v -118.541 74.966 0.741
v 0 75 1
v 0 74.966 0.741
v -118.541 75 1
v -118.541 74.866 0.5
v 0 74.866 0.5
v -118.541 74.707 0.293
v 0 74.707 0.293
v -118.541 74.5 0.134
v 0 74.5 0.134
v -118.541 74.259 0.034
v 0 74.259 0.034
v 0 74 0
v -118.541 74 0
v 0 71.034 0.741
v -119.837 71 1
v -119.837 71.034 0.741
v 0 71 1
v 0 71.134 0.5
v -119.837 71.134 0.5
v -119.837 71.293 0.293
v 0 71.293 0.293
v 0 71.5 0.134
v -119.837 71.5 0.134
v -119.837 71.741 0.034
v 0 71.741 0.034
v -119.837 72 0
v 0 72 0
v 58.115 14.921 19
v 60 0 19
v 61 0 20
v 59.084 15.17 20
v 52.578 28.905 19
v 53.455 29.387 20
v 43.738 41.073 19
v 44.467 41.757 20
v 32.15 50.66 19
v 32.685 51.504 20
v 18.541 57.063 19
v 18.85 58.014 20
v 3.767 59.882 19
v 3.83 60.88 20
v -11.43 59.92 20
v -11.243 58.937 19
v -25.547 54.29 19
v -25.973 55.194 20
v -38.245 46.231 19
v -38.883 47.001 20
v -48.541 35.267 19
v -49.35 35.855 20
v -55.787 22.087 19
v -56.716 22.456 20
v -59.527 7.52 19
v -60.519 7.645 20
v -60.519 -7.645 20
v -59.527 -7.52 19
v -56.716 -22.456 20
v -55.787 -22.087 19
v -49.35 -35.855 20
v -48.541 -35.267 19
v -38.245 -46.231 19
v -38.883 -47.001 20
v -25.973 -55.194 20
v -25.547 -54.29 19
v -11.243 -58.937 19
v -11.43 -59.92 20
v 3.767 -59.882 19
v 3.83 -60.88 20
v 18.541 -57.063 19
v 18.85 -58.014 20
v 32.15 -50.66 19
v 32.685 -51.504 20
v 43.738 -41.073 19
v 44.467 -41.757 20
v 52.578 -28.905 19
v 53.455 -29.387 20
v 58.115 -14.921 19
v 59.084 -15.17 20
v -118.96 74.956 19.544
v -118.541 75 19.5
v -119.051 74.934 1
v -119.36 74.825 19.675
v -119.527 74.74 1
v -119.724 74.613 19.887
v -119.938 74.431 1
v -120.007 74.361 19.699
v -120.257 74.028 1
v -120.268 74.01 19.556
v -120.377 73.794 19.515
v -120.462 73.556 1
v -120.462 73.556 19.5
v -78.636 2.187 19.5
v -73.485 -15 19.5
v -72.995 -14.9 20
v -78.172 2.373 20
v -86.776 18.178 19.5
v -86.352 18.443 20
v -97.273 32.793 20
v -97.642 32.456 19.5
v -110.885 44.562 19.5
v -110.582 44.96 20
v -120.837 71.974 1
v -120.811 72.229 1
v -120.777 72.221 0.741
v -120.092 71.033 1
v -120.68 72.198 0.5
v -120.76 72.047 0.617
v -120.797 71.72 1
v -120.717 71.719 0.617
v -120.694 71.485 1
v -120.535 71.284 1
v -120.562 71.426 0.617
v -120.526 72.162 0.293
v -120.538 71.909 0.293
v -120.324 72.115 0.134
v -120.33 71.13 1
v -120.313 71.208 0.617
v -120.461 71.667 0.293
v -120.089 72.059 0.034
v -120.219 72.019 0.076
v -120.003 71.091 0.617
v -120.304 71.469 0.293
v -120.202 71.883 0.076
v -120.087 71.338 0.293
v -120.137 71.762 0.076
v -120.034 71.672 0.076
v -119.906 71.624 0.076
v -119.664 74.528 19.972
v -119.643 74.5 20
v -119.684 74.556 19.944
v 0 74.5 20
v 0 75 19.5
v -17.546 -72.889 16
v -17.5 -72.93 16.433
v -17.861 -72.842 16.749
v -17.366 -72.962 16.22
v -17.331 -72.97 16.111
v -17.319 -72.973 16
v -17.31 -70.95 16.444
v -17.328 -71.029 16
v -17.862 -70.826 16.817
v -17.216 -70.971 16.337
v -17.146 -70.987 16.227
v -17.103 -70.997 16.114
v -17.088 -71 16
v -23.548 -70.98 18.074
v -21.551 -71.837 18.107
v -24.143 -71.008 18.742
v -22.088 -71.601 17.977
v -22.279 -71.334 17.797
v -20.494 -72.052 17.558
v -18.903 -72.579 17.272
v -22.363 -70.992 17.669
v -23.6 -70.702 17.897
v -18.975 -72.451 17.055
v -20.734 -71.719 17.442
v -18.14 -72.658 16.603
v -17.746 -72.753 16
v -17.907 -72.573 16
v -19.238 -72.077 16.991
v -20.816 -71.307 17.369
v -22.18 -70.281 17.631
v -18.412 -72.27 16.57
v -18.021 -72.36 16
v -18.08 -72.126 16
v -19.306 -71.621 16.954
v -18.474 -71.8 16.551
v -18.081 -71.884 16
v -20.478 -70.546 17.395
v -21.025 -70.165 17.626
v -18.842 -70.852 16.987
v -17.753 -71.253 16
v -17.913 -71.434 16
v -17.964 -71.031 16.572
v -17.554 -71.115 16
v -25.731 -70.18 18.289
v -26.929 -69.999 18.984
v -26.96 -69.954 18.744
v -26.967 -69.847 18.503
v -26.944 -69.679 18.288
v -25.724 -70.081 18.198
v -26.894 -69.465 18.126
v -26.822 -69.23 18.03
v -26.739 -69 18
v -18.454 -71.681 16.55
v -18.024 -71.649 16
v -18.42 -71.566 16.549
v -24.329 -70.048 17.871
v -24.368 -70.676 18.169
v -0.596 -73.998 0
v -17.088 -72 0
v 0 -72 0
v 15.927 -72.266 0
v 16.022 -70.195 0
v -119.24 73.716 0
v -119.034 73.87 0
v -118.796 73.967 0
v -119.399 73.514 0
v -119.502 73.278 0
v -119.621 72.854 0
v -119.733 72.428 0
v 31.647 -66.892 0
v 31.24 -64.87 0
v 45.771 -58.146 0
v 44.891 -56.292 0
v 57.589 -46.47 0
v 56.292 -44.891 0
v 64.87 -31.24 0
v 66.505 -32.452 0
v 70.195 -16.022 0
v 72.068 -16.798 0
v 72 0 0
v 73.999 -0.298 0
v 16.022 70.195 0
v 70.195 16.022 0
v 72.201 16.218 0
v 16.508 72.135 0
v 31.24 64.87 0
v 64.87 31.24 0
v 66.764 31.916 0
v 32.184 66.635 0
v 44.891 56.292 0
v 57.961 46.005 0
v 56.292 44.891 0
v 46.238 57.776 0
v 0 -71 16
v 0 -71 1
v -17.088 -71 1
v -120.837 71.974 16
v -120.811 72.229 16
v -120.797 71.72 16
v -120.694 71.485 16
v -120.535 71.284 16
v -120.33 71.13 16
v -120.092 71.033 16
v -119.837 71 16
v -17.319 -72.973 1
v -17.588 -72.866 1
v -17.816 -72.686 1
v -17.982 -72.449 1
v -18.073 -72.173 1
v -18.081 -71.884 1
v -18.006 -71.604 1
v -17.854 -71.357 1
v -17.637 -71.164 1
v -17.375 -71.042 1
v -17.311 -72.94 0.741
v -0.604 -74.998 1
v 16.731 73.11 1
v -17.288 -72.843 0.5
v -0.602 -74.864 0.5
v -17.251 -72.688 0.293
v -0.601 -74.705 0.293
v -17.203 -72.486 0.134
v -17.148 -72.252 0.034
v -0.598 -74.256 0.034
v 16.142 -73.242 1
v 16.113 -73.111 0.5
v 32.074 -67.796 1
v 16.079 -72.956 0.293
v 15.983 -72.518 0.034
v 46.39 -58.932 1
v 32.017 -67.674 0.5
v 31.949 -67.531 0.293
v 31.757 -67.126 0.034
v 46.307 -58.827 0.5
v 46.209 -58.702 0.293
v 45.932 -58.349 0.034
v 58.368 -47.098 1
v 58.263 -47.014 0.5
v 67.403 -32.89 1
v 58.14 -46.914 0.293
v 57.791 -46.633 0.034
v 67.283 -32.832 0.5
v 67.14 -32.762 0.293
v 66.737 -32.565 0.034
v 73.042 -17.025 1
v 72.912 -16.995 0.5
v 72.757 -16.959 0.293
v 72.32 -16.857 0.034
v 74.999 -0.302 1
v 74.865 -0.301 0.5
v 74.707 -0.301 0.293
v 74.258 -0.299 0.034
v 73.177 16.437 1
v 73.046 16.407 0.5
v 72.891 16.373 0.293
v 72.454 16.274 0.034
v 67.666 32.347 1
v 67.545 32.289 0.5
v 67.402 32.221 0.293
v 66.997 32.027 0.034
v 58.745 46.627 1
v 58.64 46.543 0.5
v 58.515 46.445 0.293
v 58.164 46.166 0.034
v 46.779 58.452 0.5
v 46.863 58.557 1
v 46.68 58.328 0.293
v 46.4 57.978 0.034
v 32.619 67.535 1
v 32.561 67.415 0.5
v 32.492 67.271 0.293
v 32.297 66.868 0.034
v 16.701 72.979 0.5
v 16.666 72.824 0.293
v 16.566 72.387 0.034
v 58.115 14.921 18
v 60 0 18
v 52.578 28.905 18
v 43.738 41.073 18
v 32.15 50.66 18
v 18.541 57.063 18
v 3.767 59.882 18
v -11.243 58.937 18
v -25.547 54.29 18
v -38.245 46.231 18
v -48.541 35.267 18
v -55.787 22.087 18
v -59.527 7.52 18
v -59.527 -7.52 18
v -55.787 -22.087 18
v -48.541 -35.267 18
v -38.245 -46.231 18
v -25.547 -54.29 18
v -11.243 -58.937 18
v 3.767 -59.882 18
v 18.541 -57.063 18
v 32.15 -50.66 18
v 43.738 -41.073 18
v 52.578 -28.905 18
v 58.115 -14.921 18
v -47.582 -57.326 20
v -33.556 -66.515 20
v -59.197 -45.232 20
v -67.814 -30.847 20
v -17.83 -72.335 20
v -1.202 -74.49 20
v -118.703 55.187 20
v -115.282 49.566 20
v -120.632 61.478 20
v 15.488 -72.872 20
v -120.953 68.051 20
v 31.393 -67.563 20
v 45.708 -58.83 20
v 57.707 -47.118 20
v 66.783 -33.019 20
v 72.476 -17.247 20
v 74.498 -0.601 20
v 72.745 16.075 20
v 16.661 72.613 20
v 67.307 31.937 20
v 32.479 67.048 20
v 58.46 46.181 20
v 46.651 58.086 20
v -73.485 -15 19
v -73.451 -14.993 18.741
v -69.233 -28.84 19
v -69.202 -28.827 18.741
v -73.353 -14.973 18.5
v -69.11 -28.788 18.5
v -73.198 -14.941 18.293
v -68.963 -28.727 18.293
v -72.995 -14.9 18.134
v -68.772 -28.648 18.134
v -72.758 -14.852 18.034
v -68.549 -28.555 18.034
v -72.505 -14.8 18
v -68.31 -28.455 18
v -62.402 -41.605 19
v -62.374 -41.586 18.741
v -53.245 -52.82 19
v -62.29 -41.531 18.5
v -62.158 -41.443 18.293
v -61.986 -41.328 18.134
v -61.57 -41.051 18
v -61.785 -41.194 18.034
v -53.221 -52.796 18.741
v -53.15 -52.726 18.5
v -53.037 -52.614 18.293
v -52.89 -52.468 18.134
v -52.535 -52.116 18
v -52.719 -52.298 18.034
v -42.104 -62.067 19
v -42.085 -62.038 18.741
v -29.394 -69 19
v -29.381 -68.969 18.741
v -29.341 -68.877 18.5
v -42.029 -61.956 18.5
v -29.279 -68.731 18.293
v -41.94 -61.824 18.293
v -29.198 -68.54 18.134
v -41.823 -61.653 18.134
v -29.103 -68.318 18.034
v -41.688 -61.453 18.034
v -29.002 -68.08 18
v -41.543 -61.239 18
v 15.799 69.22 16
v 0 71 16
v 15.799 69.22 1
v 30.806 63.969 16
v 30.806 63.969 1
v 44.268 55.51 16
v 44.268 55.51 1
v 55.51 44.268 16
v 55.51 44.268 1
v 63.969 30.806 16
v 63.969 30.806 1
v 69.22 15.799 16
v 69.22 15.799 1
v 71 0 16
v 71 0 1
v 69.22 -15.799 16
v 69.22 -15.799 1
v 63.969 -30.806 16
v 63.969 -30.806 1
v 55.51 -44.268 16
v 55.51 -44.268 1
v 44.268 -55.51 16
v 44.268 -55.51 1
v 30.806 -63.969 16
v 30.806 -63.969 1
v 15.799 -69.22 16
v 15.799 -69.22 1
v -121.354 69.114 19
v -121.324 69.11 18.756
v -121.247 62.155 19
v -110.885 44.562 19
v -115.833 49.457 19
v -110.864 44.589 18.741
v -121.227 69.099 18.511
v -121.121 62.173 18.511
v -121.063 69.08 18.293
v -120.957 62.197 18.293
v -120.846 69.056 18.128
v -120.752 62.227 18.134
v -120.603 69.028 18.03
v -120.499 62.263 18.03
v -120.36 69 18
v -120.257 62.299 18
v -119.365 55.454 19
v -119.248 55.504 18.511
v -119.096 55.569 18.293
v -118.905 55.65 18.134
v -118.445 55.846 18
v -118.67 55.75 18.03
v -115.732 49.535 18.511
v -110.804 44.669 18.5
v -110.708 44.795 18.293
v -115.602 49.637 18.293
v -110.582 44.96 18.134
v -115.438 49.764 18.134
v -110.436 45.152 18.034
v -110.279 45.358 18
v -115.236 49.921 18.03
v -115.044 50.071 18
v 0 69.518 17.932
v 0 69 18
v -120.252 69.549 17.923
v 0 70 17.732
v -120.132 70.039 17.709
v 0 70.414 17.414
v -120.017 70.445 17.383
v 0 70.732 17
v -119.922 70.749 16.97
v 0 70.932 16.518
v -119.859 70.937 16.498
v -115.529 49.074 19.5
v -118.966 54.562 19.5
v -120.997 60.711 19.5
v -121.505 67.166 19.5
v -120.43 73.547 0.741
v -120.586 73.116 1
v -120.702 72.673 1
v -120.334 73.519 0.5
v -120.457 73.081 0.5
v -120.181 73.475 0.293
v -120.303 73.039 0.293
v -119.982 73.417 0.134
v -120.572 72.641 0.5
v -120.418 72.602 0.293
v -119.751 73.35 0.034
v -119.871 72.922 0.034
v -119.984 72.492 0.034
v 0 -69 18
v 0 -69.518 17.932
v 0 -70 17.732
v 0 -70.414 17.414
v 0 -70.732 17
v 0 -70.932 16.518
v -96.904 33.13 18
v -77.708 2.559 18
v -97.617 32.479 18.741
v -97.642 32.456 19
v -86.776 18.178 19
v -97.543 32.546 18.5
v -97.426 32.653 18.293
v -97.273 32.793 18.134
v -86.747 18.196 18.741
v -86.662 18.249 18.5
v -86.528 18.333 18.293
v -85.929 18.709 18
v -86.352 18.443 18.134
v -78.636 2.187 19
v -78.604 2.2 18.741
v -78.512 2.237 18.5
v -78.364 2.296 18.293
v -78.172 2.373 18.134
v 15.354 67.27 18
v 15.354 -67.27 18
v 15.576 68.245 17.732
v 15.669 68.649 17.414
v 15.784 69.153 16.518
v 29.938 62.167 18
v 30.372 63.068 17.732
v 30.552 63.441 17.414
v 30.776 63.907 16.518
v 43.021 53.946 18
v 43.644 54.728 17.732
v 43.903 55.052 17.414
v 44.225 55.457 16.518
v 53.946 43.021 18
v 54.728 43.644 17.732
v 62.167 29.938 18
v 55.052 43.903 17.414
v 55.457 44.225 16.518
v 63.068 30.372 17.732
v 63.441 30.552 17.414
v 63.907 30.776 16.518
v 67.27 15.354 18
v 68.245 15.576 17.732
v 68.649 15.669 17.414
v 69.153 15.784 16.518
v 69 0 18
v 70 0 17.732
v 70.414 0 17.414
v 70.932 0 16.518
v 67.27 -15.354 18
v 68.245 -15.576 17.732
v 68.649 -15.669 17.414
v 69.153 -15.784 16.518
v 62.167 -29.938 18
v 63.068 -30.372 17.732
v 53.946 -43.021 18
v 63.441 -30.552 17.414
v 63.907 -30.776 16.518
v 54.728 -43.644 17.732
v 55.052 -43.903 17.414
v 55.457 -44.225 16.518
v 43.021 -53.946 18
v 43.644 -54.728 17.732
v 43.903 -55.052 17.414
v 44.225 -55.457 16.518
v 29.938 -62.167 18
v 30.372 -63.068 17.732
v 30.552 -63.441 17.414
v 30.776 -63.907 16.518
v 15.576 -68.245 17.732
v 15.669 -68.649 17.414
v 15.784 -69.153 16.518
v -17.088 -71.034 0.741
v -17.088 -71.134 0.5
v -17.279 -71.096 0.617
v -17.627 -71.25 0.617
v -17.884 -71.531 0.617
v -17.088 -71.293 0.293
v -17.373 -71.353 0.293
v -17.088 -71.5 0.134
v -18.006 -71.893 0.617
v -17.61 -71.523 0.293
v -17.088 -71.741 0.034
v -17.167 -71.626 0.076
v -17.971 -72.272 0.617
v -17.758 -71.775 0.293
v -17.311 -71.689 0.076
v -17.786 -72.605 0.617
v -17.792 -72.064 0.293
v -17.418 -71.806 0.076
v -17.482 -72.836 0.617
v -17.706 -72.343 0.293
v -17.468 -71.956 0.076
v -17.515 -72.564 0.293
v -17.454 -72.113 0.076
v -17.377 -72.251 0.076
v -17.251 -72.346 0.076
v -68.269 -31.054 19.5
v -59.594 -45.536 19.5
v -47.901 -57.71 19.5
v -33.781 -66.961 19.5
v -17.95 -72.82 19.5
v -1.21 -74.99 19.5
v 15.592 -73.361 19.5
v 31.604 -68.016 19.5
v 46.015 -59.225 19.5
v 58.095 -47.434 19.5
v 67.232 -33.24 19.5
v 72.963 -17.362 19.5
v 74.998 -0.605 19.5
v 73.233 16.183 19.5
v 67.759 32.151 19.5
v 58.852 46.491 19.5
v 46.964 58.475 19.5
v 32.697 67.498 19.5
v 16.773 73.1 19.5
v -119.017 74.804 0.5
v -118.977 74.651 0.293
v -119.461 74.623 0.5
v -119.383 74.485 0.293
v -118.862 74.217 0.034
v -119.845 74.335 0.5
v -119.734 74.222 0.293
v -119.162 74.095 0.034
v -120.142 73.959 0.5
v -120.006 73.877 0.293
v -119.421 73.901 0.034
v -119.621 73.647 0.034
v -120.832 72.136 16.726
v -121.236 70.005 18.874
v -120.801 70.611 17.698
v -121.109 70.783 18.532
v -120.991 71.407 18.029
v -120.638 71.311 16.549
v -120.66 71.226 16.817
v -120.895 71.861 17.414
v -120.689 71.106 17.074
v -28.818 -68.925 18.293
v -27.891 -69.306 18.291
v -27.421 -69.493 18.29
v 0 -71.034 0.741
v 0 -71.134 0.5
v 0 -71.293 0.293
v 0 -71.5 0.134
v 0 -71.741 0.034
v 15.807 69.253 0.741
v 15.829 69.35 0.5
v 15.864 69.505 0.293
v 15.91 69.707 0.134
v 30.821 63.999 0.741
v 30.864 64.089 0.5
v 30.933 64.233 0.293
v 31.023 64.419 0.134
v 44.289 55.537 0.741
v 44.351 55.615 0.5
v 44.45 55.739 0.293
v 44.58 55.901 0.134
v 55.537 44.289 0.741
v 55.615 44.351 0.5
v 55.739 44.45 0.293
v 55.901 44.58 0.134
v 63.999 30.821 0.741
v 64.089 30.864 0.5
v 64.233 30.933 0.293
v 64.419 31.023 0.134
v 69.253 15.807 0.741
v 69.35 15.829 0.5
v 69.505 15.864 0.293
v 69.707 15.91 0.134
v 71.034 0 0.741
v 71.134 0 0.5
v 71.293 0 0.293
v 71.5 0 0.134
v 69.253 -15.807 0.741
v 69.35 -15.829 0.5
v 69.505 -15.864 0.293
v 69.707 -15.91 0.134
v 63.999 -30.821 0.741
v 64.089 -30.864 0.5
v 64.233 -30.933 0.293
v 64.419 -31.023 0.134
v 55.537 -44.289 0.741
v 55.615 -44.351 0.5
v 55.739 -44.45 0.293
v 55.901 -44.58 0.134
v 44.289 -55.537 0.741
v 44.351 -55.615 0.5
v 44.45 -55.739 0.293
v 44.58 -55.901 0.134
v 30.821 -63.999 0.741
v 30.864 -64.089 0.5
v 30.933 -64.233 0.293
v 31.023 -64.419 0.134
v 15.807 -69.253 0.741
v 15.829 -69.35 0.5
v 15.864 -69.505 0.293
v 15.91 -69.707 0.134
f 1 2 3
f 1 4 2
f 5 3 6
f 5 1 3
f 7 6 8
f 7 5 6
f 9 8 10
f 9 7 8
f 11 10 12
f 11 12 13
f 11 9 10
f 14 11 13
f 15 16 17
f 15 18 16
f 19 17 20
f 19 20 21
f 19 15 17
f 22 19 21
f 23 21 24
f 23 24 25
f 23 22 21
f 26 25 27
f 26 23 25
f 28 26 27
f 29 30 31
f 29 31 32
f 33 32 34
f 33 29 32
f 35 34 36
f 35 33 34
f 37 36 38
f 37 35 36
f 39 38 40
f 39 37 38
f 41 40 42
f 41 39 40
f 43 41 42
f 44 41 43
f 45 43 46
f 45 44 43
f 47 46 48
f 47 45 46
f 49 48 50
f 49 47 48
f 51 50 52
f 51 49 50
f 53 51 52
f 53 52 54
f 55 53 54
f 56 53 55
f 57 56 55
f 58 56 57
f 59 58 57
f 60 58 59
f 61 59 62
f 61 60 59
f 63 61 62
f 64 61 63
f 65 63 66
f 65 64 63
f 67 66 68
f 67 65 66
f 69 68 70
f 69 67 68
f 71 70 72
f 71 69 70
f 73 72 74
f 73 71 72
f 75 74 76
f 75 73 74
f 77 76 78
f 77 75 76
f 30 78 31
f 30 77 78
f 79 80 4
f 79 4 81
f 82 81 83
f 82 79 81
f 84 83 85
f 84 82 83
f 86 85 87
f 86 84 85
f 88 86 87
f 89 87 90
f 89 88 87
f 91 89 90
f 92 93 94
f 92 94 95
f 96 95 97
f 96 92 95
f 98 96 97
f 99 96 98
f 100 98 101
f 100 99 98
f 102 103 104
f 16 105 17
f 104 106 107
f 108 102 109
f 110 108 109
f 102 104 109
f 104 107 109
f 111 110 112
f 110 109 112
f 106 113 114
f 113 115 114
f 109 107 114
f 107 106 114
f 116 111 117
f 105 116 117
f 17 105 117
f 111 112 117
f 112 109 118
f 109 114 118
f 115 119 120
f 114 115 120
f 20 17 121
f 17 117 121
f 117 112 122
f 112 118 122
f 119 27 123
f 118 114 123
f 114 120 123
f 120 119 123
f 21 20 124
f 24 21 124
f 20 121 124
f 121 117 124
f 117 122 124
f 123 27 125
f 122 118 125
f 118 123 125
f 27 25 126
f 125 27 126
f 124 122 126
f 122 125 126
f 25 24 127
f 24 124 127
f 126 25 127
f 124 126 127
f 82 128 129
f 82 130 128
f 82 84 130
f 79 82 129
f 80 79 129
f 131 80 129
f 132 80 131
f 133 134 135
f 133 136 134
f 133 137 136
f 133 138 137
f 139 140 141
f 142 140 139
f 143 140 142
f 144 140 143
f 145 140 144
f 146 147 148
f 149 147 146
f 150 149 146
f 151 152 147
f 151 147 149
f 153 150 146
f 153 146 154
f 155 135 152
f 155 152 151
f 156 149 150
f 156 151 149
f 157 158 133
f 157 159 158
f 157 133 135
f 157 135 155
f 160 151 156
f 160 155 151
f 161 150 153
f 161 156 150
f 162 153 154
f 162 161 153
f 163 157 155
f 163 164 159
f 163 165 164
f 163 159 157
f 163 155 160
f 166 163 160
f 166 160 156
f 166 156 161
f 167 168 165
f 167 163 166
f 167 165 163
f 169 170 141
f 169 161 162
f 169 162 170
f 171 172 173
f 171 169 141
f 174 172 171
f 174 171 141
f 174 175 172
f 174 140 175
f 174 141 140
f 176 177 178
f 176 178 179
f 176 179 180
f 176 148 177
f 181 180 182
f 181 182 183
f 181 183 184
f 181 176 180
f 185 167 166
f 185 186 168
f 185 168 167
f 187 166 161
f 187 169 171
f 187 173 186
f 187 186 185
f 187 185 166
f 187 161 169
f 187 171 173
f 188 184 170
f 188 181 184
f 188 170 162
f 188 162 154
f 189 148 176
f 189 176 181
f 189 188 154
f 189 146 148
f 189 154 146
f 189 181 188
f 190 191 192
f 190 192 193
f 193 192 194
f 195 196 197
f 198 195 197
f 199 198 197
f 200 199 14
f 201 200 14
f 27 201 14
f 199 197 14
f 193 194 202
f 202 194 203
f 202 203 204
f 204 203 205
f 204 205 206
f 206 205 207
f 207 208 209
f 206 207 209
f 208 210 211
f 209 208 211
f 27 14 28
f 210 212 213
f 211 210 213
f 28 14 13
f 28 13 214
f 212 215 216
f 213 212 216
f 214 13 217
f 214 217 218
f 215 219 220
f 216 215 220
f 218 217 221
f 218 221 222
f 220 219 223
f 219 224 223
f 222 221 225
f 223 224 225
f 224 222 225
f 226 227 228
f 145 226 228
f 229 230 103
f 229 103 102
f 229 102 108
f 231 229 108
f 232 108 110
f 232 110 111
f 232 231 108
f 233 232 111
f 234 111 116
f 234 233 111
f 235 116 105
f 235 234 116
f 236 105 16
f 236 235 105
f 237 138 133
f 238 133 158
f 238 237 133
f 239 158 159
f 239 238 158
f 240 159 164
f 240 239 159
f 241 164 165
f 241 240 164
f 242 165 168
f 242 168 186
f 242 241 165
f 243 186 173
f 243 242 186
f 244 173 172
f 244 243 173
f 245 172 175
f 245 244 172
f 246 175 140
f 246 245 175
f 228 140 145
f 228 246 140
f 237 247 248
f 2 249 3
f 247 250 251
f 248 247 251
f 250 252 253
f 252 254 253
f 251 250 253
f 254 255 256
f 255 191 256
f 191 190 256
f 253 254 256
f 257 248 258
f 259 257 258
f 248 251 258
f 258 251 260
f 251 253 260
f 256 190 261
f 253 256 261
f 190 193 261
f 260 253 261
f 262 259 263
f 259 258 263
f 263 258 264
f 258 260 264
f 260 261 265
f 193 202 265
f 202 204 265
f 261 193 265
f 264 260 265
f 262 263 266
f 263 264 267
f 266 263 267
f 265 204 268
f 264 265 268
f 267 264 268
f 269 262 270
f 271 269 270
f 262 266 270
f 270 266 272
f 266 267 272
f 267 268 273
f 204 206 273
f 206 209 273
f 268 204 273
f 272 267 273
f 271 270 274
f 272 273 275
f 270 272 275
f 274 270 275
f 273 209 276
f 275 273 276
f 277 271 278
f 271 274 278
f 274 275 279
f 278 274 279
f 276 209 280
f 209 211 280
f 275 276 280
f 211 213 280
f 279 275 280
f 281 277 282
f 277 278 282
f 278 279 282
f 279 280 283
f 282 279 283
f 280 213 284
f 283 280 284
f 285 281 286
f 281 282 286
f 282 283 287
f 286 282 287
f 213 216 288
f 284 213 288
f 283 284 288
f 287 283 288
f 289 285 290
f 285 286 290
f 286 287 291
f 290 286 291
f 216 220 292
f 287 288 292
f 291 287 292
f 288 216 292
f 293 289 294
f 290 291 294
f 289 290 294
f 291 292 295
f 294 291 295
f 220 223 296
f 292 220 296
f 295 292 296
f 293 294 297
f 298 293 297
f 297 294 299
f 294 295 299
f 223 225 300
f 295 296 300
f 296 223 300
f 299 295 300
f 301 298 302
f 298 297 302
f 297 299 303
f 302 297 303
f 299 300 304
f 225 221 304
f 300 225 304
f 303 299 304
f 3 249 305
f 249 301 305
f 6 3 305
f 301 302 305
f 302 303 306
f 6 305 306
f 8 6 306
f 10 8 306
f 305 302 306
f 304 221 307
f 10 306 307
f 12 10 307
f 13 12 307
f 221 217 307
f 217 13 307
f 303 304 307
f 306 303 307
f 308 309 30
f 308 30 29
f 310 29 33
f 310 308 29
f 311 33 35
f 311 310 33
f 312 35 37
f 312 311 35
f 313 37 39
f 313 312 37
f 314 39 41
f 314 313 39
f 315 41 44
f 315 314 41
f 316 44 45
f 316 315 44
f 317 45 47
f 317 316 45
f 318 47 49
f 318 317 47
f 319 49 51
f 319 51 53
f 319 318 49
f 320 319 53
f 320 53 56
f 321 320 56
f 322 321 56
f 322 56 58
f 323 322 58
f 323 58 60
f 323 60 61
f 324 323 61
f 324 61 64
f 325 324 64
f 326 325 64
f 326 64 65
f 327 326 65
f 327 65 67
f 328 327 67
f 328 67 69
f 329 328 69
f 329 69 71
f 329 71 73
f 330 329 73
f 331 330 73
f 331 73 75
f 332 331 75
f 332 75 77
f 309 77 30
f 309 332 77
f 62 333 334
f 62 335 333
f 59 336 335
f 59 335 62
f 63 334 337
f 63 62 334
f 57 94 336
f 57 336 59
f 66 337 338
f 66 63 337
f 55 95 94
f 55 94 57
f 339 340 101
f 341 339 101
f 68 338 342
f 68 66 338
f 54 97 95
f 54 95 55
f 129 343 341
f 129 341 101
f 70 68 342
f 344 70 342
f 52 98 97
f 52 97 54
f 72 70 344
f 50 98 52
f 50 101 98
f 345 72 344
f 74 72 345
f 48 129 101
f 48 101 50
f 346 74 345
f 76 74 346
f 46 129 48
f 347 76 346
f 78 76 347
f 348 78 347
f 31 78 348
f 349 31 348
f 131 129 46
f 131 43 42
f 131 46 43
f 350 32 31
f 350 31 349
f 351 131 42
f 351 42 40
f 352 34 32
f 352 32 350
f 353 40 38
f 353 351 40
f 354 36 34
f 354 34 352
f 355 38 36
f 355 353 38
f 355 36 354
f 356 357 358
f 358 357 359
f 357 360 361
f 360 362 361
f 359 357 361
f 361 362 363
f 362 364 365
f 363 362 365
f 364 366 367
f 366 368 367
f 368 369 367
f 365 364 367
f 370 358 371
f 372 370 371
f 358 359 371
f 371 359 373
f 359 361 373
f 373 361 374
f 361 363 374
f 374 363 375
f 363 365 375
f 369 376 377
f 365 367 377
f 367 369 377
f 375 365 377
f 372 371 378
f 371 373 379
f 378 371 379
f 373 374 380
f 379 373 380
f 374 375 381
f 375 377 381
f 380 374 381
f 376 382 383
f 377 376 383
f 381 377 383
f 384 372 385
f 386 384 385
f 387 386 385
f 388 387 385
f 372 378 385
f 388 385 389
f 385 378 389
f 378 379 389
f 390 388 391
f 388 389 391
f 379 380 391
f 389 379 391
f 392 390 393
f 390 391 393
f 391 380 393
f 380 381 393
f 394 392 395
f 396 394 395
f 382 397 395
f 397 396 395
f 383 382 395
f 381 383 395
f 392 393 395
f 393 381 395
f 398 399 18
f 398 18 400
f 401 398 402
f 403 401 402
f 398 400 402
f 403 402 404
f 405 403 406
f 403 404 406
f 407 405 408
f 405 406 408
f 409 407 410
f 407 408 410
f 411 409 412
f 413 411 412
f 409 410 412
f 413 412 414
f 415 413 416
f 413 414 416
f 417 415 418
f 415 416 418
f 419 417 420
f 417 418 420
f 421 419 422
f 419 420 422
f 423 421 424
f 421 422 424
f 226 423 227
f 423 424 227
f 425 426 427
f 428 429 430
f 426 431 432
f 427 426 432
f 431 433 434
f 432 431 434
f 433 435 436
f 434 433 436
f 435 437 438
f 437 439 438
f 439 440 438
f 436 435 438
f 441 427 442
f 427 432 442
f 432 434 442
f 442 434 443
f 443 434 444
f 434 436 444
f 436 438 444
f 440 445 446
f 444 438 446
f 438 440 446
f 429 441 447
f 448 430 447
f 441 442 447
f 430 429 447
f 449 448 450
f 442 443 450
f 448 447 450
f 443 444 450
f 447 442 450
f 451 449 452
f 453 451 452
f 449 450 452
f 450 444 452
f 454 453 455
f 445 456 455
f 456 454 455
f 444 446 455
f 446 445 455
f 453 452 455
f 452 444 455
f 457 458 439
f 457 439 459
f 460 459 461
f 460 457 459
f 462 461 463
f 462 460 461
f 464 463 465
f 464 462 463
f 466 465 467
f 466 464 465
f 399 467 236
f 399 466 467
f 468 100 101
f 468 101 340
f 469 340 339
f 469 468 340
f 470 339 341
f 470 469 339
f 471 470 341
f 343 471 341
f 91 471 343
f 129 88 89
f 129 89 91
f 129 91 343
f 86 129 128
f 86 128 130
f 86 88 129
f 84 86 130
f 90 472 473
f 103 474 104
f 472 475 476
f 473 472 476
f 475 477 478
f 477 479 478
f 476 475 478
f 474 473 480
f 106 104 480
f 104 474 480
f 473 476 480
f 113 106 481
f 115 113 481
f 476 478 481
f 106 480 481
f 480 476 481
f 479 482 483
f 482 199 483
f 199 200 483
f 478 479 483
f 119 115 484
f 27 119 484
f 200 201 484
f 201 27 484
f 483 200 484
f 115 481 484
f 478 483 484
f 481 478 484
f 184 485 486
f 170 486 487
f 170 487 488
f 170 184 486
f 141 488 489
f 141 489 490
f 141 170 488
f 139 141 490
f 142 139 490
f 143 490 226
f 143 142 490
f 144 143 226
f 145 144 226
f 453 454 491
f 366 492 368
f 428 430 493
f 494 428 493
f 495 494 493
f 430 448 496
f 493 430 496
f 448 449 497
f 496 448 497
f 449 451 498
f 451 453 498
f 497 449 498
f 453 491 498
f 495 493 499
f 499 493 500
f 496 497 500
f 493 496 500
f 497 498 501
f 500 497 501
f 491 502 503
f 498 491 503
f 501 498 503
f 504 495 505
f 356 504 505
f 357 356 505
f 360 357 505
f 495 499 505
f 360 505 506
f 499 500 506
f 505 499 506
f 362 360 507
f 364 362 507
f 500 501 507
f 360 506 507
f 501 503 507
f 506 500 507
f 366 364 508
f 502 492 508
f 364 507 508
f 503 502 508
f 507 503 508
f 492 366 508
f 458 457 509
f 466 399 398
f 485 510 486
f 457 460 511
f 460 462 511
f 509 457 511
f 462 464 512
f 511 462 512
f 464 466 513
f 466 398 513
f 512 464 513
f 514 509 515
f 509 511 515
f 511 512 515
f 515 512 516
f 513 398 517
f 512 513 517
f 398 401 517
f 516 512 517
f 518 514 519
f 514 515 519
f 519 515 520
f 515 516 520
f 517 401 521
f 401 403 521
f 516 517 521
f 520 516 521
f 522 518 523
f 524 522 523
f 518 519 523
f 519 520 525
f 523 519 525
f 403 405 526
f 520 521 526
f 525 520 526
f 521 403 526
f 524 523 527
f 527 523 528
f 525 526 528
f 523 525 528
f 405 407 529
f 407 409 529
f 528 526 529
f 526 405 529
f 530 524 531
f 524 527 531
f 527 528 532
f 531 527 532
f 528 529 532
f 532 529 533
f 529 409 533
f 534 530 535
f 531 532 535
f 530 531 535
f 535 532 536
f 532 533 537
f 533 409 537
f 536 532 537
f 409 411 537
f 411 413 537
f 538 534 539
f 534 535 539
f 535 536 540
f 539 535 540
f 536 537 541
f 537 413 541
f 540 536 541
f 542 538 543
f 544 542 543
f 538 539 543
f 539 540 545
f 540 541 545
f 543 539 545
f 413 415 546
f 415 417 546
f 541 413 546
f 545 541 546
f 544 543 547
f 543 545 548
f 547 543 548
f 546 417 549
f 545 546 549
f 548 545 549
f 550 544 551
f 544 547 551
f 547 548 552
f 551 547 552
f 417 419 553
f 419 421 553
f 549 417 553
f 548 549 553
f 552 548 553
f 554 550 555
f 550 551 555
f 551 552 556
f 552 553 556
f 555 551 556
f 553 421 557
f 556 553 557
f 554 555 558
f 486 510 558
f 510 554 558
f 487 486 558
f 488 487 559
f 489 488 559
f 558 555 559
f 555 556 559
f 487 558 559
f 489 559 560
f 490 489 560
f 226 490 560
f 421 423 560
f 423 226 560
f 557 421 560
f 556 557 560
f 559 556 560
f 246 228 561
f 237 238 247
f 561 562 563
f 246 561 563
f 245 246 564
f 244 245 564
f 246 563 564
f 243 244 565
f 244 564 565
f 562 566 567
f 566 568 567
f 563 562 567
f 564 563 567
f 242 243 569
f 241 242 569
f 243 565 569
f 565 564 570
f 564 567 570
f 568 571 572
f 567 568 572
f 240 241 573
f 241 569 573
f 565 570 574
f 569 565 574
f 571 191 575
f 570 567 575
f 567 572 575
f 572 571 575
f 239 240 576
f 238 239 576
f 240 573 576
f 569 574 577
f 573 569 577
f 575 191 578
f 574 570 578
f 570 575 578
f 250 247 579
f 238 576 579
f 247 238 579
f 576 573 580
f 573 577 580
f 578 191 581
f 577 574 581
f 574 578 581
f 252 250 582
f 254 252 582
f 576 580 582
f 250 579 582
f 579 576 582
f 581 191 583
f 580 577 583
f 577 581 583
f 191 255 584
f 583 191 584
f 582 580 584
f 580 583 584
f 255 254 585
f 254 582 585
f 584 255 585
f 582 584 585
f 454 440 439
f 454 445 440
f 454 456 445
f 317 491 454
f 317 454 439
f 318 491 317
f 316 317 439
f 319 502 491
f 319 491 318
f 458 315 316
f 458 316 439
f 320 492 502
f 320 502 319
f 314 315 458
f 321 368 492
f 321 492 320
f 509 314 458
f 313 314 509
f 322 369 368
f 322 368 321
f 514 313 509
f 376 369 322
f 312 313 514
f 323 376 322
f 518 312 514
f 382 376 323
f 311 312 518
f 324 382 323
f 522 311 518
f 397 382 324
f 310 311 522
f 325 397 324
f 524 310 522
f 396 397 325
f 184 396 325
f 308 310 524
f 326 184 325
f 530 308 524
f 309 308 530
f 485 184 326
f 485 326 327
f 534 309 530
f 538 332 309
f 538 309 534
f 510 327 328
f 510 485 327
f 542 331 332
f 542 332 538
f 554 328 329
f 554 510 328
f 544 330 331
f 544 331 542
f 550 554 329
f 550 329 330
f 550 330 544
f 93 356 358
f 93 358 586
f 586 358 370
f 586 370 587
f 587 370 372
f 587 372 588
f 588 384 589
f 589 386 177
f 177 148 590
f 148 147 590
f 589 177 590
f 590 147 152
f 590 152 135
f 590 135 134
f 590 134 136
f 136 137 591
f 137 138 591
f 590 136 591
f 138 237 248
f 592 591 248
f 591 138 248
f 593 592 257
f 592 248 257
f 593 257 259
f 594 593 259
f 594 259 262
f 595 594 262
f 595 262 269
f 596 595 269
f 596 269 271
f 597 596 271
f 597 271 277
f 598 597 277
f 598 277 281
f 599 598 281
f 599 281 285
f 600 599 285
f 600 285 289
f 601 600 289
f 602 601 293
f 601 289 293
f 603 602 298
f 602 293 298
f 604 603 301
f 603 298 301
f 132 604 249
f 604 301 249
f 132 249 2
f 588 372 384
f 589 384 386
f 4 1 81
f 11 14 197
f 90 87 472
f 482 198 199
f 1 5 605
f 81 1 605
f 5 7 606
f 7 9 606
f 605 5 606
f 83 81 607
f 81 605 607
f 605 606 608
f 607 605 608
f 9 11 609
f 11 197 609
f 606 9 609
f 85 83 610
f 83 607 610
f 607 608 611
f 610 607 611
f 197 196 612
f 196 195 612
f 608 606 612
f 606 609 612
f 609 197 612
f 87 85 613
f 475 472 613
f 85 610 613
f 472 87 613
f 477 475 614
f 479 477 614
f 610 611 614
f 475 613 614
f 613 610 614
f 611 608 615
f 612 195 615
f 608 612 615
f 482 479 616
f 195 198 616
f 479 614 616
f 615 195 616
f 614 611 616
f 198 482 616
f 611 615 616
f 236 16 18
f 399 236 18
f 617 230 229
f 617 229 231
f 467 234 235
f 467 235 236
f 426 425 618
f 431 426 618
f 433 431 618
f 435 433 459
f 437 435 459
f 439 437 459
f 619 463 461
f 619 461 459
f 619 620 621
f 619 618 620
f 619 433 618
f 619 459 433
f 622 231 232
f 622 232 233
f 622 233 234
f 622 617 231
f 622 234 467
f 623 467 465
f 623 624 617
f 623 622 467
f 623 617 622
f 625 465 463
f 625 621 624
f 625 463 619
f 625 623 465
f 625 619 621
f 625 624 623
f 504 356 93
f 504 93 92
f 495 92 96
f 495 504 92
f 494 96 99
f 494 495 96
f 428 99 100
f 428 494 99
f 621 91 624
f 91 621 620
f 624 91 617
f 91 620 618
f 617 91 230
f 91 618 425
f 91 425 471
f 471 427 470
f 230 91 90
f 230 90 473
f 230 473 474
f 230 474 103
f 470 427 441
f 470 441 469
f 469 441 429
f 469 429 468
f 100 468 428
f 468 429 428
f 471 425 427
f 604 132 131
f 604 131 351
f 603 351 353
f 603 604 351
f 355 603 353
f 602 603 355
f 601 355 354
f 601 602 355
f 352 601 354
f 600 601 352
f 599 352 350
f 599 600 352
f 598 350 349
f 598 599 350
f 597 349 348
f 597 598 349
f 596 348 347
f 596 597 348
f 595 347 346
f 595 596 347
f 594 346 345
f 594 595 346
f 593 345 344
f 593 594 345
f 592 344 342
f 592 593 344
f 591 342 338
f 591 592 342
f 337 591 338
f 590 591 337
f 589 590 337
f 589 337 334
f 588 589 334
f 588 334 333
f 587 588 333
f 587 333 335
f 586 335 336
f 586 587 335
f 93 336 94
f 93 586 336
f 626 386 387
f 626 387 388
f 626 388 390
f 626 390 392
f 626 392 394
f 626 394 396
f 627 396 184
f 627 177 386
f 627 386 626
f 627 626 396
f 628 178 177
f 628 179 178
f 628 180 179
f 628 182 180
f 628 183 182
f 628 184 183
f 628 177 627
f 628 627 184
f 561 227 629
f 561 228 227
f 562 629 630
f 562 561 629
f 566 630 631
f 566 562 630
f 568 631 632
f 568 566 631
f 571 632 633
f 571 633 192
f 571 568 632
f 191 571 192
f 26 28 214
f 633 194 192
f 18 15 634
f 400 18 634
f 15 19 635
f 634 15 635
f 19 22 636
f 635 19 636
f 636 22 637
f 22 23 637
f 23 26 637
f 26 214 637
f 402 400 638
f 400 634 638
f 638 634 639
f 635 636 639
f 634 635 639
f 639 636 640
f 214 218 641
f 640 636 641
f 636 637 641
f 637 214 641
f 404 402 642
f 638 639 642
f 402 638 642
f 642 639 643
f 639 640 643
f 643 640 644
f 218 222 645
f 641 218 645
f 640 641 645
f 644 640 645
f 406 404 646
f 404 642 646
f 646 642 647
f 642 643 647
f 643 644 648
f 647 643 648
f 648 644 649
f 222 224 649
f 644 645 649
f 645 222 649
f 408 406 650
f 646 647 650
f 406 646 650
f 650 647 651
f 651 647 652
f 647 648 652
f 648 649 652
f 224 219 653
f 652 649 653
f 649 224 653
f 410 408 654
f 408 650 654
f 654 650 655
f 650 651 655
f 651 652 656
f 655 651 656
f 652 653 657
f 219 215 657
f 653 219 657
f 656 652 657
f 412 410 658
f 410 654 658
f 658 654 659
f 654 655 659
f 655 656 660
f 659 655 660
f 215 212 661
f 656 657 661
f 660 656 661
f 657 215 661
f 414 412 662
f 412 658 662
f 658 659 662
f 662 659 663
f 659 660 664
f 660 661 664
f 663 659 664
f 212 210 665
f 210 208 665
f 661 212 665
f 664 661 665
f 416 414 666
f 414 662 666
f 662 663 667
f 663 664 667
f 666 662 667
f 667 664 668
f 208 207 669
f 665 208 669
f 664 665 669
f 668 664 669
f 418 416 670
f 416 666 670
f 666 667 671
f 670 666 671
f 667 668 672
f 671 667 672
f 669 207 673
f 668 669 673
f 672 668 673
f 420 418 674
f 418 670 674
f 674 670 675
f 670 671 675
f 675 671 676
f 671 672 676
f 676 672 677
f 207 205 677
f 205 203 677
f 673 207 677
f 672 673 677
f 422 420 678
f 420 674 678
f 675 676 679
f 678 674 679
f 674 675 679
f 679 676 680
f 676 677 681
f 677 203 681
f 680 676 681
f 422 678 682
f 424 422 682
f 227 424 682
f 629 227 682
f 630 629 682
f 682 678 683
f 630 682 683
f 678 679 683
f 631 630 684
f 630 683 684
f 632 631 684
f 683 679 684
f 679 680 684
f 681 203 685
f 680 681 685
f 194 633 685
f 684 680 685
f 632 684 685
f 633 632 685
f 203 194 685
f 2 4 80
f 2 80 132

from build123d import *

# Parameters (mm, degrees)
SKETCH_R        = 60
PAD_DEPTH       = 20
POCKET_DEPTH    = 18
FILLET_R        = 2
FILLET001_R     = 1
CHAMFER_SIZE    = 0.5
FILLET002_R     = 2
FILLET003_R     = 1
CHAMFER001_SIZE = 1


with BuildPart() as part:
    # Sketch → Pad (new body)
    with BuildSketch(Plane.XY):
        with BuildLine():
            ThreePointArc((-73.484692, -15), (58.09475, -47.434165), (0, 75))
            Line((-120, 75), (0, 75))
            ThreePointArc((-120, 75), (-120.393773, 58.298385), (-110.885031, 44.562198))
            ThreePointArc((-73.484692, -15), (-86.775791, 18.177566), (-110.885031, 44.562198))
        make_face()
        Circle(SKETCH_R, mode=Mode.SUBTRACT)
    extrude(amount=PAD_DEPTH)

    # Sketch001 → Pocket (cut)
    with BuildSketch(Plane(origin=(0, 0, 0), x_dir=(1, 0, 0), z_dir=(0, 0, -1))):
        with BuildLine():
            Line((-146.216, -71), (0, -71))
            ThreePointArc((0, -71), (71, 0), (0, 71))
            Line((0, 71), (-146.216, 71))
            Line((-146.216, -71), (-146.216, 71))
        make_face()
    extrude(amount=-POCKET_DEPTH, mode=Mode.SUBTRACT)

    # Fillet
    fillet_edges = [part.edges().sort_by_distance(p)[0] for p in [
        (71, 0, 18),
    ]]
    fillet(fillet_edges, radius=FILLET_R)

    # Fillet001
    fillet001_edges = [part.edges().sort_by_distance(p)[0] for p in [
        (-24.166092, -71, 8),
    ]]
    fillet(fillet001_edges, radius=FILLET001_R)

    # Chamfer
    chamfer_edges = [part.edges().sort_by_distance(p)[0] for p in [
        (-60, 75, 20),
    ]]
    chamfer(chamfer_edges, length=CHAMFER_SIZE)

    # Fillet002
    fillet002_edges = [part.edges().sort_by_distance(p)[0] for p in [
        (-120, 75, 9.75),
    ]]
    fillet(fillet002_edges, radius=FILLET002_R)

    # Fillet003
    fillet003_edges = [part.edges().sort_by_distance(p)[0] for p in [
        (74.49152, -8.718573, 0),
    ]]
    fillet(fillet003_edges, radius=FILLET003_R)

    # Chamfer001
    chamfer001_edges = [part.edges().sort_by_distance(p)[0] for p in [
        (-60, 0, 20),
    ]]
    chamfer(chamfer001_edges, length=CHAMFER001_SIZE)


solid = part.part
